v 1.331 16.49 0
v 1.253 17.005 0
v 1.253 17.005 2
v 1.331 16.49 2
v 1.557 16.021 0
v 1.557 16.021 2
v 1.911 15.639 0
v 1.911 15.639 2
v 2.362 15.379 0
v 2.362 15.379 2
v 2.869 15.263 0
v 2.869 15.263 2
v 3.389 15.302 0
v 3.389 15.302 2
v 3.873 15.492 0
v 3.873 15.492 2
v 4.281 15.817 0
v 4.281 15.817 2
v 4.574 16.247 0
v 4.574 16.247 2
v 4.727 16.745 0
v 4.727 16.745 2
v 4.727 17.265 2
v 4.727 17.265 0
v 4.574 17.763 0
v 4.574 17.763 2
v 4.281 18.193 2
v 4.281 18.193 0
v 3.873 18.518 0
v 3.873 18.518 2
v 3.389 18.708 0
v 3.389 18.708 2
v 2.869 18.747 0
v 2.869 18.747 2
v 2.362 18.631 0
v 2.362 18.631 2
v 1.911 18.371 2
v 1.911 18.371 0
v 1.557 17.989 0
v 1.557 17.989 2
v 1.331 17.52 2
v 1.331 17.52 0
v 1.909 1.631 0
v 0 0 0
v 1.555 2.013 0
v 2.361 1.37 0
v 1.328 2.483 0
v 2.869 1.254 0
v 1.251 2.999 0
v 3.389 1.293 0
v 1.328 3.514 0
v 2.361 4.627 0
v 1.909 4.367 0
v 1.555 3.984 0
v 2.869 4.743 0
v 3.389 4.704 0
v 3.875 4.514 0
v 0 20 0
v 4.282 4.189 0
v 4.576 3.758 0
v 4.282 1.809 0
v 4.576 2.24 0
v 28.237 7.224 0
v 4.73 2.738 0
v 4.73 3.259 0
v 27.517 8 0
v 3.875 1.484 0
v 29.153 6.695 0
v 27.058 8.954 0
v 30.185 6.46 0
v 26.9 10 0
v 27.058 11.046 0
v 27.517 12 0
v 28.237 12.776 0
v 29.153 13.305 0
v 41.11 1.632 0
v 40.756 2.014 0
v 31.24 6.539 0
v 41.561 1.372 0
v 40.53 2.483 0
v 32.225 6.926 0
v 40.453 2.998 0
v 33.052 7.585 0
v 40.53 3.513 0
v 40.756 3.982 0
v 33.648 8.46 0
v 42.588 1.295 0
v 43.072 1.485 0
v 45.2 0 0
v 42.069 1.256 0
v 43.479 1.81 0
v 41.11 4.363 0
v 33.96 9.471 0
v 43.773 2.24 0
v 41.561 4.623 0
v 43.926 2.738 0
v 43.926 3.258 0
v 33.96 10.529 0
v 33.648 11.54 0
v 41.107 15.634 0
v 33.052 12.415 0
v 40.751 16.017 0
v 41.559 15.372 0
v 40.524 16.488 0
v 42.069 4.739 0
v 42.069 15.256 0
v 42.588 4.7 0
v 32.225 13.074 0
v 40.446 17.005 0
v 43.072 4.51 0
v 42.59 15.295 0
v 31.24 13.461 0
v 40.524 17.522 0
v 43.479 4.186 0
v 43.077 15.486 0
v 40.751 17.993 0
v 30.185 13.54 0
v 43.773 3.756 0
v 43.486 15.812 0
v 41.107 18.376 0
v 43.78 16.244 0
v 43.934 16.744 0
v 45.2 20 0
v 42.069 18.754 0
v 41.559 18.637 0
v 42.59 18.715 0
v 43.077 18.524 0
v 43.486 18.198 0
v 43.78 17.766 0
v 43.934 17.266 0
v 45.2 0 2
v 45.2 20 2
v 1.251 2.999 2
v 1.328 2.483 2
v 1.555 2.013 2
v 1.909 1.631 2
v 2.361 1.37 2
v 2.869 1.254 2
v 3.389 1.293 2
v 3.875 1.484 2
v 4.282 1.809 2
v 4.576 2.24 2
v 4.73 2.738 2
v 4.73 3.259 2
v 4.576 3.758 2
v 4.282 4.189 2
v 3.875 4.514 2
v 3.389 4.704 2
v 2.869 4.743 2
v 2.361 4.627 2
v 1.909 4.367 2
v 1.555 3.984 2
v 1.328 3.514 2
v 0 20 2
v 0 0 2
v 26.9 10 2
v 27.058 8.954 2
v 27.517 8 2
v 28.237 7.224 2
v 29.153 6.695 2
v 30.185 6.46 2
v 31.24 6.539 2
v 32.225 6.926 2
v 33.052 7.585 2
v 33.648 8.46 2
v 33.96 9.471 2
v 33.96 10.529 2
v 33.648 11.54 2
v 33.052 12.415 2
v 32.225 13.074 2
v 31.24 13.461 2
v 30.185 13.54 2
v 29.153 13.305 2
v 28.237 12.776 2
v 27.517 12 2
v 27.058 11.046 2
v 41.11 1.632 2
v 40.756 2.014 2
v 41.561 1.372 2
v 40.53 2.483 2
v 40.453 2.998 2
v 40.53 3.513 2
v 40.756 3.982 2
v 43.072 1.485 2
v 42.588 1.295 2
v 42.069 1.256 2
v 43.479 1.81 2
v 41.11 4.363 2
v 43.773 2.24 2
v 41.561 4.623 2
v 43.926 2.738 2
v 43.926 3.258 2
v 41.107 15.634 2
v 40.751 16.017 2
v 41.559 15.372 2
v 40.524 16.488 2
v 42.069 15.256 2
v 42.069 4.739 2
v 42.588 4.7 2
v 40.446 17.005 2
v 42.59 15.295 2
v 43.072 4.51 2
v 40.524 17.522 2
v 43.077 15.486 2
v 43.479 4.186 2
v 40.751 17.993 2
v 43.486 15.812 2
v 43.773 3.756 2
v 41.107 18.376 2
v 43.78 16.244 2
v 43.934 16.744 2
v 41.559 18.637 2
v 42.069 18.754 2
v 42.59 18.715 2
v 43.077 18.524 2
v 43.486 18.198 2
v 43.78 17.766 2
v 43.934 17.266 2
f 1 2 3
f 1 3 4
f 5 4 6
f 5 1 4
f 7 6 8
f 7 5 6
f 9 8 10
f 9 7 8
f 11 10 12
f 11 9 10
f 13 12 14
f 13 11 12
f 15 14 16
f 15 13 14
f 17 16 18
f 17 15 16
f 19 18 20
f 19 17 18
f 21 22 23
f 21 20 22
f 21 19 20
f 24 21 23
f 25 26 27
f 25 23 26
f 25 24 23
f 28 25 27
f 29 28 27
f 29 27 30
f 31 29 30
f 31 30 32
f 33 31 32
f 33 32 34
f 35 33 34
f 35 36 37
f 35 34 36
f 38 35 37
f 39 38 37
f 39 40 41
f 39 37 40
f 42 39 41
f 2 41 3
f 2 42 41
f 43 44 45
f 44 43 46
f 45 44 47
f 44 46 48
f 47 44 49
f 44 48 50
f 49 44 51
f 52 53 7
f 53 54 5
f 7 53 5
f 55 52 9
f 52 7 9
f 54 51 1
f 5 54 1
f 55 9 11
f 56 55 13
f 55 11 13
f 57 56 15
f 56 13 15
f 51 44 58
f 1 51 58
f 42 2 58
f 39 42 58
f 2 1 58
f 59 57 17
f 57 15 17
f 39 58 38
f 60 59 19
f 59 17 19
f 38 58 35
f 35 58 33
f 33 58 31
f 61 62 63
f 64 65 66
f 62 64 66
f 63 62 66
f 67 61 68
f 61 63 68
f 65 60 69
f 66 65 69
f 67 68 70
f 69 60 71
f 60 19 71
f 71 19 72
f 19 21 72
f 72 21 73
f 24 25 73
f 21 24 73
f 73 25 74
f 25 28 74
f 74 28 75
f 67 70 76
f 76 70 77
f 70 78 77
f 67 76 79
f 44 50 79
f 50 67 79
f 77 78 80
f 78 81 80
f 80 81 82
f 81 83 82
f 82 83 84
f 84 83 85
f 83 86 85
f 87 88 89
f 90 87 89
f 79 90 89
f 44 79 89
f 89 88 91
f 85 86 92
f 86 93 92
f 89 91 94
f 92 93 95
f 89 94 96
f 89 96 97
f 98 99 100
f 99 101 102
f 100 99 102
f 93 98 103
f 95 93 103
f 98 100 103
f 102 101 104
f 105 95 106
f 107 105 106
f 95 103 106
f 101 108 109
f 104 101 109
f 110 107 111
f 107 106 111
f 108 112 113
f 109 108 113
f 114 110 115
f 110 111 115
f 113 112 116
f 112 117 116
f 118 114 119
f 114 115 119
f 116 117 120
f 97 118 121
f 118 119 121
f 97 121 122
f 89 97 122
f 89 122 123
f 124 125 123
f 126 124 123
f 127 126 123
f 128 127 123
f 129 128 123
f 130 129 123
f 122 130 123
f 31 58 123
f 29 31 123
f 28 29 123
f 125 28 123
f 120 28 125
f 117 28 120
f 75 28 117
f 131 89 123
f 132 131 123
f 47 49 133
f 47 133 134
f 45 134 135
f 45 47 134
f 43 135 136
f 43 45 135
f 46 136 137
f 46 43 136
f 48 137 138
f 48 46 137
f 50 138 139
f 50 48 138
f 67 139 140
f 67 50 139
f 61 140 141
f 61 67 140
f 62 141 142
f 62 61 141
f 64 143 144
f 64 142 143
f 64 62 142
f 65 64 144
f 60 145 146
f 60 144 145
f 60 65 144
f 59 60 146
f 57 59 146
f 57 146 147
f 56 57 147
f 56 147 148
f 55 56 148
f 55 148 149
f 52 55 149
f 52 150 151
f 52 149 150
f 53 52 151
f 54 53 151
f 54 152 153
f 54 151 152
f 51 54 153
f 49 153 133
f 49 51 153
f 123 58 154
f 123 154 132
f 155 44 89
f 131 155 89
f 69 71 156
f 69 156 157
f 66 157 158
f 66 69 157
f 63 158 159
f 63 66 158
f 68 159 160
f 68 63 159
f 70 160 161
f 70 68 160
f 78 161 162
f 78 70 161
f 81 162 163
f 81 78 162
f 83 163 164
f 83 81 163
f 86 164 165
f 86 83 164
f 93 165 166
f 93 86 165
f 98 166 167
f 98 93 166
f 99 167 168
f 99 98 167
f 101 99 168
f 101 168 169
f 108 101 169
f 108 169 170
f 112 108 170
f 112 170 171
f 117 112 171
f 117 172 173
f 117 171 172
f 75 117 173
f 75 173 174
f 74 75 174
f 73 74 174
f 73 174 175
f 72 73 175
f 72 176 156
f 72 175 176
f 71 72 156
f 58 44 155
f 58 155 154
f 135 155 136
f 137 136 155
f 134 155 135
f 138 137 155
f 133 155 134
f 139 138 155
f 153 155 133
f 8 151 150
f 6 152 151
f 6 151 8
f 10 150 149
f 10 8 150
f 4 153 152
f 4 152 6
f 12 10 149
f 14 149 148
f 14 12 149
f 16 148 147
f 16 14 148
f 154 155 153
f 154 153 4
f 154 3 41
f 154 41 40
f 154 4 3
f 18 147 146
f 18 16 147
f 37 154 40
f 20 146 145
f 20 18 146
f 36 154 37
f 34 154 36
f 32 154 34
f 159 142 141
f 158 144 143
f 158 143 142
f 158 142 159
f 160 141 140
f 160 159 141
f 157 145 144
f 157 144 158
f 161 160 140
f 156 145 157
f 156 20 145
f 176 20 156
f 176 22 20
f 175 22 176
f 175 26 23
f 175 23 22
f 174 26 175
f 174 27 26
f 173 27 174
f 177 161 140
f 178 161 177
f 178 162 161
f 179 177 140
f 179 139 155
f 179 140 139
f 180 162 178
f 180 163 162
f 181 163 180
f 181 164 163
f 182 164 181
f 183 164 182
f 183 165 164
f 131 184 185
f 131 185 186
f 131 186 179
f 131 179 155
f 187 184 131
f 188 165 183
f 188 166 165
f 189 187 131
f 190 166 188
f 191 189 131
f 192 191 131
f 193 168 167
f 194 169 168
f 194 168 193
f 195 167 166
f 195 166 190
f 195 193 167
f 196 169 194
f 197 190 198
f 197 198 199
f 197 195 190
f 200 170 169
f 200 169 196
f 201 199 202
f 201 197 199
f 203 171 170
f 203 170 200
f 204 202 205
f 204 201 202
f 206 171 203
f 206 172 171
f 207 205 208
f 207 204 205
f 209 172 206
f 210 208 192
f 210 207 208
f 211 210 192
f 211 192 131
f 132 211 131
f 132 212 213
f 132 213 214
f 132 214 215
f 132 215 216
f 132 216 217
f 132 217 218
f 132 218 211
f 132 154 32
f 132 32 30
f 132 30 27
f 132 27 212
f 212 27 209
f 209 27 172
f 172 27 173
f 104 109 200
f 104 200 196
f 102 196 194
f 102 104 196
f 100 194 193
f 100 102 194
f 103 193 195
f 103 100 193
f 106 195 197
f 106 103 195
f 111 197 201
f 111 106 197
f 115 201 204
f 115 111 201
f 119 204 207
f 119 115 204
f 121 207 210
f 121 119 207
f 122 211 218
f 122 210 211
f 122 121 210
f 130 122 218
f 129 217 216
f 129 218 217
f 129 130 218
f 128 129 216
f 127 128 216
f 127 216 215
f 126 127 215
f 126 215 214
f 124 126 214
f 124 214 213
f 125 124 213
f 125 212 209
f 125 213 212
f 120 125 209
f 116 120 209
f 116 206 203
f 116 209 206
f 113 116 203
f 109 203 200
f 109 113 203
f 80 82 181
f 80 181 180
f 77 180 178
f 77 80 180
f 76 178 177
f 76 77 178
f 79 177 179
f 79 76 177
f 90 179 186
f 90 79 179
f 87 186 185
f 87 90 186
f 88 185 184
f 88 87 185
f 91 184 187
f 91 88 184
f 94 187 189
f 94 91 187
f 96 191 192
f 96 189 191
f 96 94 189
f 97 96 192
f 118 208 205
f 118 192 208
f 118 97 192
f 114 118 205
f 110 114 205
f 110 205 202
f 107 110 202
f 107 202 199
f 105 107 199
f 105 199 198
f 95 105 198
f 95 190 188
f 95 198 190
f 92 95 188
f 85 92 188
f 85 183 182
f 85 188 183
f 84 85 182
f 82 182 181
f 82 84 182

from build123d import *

# Parameters (mm, degrees)
CIRCLE004_R      = 3.55
EXTRUDE004_DEPTH = 10
CIRCLE002_R      = 1.753689
EXTRUDE003_DEPTH = 10
CIRCLE001_R      = 1.746402
EXTRUDE002_DEPTH = 10
CIRCLE003_R      = 1.746988
EXTRUDE_DEPTH    = 10
CIRCLE_R         = 1.749447
EXTRUDE001_DEPTH = 10
BOX_W            = 45.2
BOX_H            = 20
BOX_DEPTH        = 2


with BuildPart() as extrude004:
    # Circle004 → Extrude004 (new body)
    with BuildSketch(Plane(origin=(30.45, 10, 2), x_dir=(-1, 0, 0), z_dir=(0, 0, 1))):
        Circle(CIRCLE004_R)
    extrude(amount=EXTRUDE004_DEPTH)


with BuildPart() as extrude004_1:
    # Extrude004 placement: moved
    add(extrude004.part.moved(Location((0, 0, -4))))


with BuildPart() as extrude003:
    # Circle002 → Extrude003 (new body)
    with BuildSketch(Plane(origin=(42.2, 17.004963, 2), x_dir=(-1, 0, 0), z_dir=(0, 0, 1))):
        Circle(CIRCLE002_R)
    extrude(amount=EXTRUDE003_DEPTH)


with BuildPart() as extrude003_1:
    # Extrude003 placement: moved
    add(extrude003.part.moved(Location((0, 0, -5))))


with BuildPart() as extrude002:
    # Circle001 → Extrude002 (new body)
    with BuildSketch(Plane(origin=(42.199112, 2.997812, 2), x_dir=(-1, 0, 0), z_dir=(0, 0, 1))):
        Circle(CIRCLE001_R)
    extrude(amount=EXTRUDE002_DEPTH)


with BuildPart() as extrude002_1:
    # Extrude002 placement: moved
    add(extrude002.part.moved(Location((0, 0, -5))))


with BuildPart() as extrude_body:
    # Circle003 → Extrude (new body)
    with BuildSketch(Plane(origin=(3, 17.004963, 2), x_dir=(-1, 0, 0), z_dir=(0, 0, 1))):
        Circle(CIRCLE003_R)
    extrude(amount=EXTRUDE_DEPTH)


with BuildPart() as extrude_body_1:
    # Extrude placement: moved
    add(extrude_body.part.moved(Location((0, 0, -5))))


with BuildPart() as extrude001:
    # Circle → Extrude001 (new body)
    with BuildSketch(Plane(origin=(3, 2.998732, 2), x_dir=(-1, 0, 0), z_dir=(0, 0, 1))):
        Circle(CIRCLE_R)
    extrude(amount=EXTRUDE001_DEPTH)


with BuildPart() as extrude001_1:
    # Extrude001 placement: moved
    add(extrude001.part.moved(Location((0, 0, -5))))


with BuildPart() as base_con_agujeros:
    # Box → Box (new body)
    with BuildSketch(Plane.XY):
        with Locations((22.6, 10)):
            Rectangle(BOX_W, BOX_H)
    extrude(amount=BOX_DEPTH)

    # Cut: cut Extrude001
    add(extrude001_1.part, mode=Mode.SUBTRACT)

    # Cut001: cut Extrude body
    add(extrude_body_1.part, mode=Mode.SUBTRACT)

    # Cut002: cut Extrude002
    add(extrude002_1.part, mode=Mode.SUBTRACT)

    # Cut003: cut Extrude003
    add(extrude003_1.part, mode=Mode.SUBTRACT)

    # Cut004: cut Extrude004
    add(extrude004_1.part, mode=Mode.SUBTRACT)


solid = base_con_agujeros.part
